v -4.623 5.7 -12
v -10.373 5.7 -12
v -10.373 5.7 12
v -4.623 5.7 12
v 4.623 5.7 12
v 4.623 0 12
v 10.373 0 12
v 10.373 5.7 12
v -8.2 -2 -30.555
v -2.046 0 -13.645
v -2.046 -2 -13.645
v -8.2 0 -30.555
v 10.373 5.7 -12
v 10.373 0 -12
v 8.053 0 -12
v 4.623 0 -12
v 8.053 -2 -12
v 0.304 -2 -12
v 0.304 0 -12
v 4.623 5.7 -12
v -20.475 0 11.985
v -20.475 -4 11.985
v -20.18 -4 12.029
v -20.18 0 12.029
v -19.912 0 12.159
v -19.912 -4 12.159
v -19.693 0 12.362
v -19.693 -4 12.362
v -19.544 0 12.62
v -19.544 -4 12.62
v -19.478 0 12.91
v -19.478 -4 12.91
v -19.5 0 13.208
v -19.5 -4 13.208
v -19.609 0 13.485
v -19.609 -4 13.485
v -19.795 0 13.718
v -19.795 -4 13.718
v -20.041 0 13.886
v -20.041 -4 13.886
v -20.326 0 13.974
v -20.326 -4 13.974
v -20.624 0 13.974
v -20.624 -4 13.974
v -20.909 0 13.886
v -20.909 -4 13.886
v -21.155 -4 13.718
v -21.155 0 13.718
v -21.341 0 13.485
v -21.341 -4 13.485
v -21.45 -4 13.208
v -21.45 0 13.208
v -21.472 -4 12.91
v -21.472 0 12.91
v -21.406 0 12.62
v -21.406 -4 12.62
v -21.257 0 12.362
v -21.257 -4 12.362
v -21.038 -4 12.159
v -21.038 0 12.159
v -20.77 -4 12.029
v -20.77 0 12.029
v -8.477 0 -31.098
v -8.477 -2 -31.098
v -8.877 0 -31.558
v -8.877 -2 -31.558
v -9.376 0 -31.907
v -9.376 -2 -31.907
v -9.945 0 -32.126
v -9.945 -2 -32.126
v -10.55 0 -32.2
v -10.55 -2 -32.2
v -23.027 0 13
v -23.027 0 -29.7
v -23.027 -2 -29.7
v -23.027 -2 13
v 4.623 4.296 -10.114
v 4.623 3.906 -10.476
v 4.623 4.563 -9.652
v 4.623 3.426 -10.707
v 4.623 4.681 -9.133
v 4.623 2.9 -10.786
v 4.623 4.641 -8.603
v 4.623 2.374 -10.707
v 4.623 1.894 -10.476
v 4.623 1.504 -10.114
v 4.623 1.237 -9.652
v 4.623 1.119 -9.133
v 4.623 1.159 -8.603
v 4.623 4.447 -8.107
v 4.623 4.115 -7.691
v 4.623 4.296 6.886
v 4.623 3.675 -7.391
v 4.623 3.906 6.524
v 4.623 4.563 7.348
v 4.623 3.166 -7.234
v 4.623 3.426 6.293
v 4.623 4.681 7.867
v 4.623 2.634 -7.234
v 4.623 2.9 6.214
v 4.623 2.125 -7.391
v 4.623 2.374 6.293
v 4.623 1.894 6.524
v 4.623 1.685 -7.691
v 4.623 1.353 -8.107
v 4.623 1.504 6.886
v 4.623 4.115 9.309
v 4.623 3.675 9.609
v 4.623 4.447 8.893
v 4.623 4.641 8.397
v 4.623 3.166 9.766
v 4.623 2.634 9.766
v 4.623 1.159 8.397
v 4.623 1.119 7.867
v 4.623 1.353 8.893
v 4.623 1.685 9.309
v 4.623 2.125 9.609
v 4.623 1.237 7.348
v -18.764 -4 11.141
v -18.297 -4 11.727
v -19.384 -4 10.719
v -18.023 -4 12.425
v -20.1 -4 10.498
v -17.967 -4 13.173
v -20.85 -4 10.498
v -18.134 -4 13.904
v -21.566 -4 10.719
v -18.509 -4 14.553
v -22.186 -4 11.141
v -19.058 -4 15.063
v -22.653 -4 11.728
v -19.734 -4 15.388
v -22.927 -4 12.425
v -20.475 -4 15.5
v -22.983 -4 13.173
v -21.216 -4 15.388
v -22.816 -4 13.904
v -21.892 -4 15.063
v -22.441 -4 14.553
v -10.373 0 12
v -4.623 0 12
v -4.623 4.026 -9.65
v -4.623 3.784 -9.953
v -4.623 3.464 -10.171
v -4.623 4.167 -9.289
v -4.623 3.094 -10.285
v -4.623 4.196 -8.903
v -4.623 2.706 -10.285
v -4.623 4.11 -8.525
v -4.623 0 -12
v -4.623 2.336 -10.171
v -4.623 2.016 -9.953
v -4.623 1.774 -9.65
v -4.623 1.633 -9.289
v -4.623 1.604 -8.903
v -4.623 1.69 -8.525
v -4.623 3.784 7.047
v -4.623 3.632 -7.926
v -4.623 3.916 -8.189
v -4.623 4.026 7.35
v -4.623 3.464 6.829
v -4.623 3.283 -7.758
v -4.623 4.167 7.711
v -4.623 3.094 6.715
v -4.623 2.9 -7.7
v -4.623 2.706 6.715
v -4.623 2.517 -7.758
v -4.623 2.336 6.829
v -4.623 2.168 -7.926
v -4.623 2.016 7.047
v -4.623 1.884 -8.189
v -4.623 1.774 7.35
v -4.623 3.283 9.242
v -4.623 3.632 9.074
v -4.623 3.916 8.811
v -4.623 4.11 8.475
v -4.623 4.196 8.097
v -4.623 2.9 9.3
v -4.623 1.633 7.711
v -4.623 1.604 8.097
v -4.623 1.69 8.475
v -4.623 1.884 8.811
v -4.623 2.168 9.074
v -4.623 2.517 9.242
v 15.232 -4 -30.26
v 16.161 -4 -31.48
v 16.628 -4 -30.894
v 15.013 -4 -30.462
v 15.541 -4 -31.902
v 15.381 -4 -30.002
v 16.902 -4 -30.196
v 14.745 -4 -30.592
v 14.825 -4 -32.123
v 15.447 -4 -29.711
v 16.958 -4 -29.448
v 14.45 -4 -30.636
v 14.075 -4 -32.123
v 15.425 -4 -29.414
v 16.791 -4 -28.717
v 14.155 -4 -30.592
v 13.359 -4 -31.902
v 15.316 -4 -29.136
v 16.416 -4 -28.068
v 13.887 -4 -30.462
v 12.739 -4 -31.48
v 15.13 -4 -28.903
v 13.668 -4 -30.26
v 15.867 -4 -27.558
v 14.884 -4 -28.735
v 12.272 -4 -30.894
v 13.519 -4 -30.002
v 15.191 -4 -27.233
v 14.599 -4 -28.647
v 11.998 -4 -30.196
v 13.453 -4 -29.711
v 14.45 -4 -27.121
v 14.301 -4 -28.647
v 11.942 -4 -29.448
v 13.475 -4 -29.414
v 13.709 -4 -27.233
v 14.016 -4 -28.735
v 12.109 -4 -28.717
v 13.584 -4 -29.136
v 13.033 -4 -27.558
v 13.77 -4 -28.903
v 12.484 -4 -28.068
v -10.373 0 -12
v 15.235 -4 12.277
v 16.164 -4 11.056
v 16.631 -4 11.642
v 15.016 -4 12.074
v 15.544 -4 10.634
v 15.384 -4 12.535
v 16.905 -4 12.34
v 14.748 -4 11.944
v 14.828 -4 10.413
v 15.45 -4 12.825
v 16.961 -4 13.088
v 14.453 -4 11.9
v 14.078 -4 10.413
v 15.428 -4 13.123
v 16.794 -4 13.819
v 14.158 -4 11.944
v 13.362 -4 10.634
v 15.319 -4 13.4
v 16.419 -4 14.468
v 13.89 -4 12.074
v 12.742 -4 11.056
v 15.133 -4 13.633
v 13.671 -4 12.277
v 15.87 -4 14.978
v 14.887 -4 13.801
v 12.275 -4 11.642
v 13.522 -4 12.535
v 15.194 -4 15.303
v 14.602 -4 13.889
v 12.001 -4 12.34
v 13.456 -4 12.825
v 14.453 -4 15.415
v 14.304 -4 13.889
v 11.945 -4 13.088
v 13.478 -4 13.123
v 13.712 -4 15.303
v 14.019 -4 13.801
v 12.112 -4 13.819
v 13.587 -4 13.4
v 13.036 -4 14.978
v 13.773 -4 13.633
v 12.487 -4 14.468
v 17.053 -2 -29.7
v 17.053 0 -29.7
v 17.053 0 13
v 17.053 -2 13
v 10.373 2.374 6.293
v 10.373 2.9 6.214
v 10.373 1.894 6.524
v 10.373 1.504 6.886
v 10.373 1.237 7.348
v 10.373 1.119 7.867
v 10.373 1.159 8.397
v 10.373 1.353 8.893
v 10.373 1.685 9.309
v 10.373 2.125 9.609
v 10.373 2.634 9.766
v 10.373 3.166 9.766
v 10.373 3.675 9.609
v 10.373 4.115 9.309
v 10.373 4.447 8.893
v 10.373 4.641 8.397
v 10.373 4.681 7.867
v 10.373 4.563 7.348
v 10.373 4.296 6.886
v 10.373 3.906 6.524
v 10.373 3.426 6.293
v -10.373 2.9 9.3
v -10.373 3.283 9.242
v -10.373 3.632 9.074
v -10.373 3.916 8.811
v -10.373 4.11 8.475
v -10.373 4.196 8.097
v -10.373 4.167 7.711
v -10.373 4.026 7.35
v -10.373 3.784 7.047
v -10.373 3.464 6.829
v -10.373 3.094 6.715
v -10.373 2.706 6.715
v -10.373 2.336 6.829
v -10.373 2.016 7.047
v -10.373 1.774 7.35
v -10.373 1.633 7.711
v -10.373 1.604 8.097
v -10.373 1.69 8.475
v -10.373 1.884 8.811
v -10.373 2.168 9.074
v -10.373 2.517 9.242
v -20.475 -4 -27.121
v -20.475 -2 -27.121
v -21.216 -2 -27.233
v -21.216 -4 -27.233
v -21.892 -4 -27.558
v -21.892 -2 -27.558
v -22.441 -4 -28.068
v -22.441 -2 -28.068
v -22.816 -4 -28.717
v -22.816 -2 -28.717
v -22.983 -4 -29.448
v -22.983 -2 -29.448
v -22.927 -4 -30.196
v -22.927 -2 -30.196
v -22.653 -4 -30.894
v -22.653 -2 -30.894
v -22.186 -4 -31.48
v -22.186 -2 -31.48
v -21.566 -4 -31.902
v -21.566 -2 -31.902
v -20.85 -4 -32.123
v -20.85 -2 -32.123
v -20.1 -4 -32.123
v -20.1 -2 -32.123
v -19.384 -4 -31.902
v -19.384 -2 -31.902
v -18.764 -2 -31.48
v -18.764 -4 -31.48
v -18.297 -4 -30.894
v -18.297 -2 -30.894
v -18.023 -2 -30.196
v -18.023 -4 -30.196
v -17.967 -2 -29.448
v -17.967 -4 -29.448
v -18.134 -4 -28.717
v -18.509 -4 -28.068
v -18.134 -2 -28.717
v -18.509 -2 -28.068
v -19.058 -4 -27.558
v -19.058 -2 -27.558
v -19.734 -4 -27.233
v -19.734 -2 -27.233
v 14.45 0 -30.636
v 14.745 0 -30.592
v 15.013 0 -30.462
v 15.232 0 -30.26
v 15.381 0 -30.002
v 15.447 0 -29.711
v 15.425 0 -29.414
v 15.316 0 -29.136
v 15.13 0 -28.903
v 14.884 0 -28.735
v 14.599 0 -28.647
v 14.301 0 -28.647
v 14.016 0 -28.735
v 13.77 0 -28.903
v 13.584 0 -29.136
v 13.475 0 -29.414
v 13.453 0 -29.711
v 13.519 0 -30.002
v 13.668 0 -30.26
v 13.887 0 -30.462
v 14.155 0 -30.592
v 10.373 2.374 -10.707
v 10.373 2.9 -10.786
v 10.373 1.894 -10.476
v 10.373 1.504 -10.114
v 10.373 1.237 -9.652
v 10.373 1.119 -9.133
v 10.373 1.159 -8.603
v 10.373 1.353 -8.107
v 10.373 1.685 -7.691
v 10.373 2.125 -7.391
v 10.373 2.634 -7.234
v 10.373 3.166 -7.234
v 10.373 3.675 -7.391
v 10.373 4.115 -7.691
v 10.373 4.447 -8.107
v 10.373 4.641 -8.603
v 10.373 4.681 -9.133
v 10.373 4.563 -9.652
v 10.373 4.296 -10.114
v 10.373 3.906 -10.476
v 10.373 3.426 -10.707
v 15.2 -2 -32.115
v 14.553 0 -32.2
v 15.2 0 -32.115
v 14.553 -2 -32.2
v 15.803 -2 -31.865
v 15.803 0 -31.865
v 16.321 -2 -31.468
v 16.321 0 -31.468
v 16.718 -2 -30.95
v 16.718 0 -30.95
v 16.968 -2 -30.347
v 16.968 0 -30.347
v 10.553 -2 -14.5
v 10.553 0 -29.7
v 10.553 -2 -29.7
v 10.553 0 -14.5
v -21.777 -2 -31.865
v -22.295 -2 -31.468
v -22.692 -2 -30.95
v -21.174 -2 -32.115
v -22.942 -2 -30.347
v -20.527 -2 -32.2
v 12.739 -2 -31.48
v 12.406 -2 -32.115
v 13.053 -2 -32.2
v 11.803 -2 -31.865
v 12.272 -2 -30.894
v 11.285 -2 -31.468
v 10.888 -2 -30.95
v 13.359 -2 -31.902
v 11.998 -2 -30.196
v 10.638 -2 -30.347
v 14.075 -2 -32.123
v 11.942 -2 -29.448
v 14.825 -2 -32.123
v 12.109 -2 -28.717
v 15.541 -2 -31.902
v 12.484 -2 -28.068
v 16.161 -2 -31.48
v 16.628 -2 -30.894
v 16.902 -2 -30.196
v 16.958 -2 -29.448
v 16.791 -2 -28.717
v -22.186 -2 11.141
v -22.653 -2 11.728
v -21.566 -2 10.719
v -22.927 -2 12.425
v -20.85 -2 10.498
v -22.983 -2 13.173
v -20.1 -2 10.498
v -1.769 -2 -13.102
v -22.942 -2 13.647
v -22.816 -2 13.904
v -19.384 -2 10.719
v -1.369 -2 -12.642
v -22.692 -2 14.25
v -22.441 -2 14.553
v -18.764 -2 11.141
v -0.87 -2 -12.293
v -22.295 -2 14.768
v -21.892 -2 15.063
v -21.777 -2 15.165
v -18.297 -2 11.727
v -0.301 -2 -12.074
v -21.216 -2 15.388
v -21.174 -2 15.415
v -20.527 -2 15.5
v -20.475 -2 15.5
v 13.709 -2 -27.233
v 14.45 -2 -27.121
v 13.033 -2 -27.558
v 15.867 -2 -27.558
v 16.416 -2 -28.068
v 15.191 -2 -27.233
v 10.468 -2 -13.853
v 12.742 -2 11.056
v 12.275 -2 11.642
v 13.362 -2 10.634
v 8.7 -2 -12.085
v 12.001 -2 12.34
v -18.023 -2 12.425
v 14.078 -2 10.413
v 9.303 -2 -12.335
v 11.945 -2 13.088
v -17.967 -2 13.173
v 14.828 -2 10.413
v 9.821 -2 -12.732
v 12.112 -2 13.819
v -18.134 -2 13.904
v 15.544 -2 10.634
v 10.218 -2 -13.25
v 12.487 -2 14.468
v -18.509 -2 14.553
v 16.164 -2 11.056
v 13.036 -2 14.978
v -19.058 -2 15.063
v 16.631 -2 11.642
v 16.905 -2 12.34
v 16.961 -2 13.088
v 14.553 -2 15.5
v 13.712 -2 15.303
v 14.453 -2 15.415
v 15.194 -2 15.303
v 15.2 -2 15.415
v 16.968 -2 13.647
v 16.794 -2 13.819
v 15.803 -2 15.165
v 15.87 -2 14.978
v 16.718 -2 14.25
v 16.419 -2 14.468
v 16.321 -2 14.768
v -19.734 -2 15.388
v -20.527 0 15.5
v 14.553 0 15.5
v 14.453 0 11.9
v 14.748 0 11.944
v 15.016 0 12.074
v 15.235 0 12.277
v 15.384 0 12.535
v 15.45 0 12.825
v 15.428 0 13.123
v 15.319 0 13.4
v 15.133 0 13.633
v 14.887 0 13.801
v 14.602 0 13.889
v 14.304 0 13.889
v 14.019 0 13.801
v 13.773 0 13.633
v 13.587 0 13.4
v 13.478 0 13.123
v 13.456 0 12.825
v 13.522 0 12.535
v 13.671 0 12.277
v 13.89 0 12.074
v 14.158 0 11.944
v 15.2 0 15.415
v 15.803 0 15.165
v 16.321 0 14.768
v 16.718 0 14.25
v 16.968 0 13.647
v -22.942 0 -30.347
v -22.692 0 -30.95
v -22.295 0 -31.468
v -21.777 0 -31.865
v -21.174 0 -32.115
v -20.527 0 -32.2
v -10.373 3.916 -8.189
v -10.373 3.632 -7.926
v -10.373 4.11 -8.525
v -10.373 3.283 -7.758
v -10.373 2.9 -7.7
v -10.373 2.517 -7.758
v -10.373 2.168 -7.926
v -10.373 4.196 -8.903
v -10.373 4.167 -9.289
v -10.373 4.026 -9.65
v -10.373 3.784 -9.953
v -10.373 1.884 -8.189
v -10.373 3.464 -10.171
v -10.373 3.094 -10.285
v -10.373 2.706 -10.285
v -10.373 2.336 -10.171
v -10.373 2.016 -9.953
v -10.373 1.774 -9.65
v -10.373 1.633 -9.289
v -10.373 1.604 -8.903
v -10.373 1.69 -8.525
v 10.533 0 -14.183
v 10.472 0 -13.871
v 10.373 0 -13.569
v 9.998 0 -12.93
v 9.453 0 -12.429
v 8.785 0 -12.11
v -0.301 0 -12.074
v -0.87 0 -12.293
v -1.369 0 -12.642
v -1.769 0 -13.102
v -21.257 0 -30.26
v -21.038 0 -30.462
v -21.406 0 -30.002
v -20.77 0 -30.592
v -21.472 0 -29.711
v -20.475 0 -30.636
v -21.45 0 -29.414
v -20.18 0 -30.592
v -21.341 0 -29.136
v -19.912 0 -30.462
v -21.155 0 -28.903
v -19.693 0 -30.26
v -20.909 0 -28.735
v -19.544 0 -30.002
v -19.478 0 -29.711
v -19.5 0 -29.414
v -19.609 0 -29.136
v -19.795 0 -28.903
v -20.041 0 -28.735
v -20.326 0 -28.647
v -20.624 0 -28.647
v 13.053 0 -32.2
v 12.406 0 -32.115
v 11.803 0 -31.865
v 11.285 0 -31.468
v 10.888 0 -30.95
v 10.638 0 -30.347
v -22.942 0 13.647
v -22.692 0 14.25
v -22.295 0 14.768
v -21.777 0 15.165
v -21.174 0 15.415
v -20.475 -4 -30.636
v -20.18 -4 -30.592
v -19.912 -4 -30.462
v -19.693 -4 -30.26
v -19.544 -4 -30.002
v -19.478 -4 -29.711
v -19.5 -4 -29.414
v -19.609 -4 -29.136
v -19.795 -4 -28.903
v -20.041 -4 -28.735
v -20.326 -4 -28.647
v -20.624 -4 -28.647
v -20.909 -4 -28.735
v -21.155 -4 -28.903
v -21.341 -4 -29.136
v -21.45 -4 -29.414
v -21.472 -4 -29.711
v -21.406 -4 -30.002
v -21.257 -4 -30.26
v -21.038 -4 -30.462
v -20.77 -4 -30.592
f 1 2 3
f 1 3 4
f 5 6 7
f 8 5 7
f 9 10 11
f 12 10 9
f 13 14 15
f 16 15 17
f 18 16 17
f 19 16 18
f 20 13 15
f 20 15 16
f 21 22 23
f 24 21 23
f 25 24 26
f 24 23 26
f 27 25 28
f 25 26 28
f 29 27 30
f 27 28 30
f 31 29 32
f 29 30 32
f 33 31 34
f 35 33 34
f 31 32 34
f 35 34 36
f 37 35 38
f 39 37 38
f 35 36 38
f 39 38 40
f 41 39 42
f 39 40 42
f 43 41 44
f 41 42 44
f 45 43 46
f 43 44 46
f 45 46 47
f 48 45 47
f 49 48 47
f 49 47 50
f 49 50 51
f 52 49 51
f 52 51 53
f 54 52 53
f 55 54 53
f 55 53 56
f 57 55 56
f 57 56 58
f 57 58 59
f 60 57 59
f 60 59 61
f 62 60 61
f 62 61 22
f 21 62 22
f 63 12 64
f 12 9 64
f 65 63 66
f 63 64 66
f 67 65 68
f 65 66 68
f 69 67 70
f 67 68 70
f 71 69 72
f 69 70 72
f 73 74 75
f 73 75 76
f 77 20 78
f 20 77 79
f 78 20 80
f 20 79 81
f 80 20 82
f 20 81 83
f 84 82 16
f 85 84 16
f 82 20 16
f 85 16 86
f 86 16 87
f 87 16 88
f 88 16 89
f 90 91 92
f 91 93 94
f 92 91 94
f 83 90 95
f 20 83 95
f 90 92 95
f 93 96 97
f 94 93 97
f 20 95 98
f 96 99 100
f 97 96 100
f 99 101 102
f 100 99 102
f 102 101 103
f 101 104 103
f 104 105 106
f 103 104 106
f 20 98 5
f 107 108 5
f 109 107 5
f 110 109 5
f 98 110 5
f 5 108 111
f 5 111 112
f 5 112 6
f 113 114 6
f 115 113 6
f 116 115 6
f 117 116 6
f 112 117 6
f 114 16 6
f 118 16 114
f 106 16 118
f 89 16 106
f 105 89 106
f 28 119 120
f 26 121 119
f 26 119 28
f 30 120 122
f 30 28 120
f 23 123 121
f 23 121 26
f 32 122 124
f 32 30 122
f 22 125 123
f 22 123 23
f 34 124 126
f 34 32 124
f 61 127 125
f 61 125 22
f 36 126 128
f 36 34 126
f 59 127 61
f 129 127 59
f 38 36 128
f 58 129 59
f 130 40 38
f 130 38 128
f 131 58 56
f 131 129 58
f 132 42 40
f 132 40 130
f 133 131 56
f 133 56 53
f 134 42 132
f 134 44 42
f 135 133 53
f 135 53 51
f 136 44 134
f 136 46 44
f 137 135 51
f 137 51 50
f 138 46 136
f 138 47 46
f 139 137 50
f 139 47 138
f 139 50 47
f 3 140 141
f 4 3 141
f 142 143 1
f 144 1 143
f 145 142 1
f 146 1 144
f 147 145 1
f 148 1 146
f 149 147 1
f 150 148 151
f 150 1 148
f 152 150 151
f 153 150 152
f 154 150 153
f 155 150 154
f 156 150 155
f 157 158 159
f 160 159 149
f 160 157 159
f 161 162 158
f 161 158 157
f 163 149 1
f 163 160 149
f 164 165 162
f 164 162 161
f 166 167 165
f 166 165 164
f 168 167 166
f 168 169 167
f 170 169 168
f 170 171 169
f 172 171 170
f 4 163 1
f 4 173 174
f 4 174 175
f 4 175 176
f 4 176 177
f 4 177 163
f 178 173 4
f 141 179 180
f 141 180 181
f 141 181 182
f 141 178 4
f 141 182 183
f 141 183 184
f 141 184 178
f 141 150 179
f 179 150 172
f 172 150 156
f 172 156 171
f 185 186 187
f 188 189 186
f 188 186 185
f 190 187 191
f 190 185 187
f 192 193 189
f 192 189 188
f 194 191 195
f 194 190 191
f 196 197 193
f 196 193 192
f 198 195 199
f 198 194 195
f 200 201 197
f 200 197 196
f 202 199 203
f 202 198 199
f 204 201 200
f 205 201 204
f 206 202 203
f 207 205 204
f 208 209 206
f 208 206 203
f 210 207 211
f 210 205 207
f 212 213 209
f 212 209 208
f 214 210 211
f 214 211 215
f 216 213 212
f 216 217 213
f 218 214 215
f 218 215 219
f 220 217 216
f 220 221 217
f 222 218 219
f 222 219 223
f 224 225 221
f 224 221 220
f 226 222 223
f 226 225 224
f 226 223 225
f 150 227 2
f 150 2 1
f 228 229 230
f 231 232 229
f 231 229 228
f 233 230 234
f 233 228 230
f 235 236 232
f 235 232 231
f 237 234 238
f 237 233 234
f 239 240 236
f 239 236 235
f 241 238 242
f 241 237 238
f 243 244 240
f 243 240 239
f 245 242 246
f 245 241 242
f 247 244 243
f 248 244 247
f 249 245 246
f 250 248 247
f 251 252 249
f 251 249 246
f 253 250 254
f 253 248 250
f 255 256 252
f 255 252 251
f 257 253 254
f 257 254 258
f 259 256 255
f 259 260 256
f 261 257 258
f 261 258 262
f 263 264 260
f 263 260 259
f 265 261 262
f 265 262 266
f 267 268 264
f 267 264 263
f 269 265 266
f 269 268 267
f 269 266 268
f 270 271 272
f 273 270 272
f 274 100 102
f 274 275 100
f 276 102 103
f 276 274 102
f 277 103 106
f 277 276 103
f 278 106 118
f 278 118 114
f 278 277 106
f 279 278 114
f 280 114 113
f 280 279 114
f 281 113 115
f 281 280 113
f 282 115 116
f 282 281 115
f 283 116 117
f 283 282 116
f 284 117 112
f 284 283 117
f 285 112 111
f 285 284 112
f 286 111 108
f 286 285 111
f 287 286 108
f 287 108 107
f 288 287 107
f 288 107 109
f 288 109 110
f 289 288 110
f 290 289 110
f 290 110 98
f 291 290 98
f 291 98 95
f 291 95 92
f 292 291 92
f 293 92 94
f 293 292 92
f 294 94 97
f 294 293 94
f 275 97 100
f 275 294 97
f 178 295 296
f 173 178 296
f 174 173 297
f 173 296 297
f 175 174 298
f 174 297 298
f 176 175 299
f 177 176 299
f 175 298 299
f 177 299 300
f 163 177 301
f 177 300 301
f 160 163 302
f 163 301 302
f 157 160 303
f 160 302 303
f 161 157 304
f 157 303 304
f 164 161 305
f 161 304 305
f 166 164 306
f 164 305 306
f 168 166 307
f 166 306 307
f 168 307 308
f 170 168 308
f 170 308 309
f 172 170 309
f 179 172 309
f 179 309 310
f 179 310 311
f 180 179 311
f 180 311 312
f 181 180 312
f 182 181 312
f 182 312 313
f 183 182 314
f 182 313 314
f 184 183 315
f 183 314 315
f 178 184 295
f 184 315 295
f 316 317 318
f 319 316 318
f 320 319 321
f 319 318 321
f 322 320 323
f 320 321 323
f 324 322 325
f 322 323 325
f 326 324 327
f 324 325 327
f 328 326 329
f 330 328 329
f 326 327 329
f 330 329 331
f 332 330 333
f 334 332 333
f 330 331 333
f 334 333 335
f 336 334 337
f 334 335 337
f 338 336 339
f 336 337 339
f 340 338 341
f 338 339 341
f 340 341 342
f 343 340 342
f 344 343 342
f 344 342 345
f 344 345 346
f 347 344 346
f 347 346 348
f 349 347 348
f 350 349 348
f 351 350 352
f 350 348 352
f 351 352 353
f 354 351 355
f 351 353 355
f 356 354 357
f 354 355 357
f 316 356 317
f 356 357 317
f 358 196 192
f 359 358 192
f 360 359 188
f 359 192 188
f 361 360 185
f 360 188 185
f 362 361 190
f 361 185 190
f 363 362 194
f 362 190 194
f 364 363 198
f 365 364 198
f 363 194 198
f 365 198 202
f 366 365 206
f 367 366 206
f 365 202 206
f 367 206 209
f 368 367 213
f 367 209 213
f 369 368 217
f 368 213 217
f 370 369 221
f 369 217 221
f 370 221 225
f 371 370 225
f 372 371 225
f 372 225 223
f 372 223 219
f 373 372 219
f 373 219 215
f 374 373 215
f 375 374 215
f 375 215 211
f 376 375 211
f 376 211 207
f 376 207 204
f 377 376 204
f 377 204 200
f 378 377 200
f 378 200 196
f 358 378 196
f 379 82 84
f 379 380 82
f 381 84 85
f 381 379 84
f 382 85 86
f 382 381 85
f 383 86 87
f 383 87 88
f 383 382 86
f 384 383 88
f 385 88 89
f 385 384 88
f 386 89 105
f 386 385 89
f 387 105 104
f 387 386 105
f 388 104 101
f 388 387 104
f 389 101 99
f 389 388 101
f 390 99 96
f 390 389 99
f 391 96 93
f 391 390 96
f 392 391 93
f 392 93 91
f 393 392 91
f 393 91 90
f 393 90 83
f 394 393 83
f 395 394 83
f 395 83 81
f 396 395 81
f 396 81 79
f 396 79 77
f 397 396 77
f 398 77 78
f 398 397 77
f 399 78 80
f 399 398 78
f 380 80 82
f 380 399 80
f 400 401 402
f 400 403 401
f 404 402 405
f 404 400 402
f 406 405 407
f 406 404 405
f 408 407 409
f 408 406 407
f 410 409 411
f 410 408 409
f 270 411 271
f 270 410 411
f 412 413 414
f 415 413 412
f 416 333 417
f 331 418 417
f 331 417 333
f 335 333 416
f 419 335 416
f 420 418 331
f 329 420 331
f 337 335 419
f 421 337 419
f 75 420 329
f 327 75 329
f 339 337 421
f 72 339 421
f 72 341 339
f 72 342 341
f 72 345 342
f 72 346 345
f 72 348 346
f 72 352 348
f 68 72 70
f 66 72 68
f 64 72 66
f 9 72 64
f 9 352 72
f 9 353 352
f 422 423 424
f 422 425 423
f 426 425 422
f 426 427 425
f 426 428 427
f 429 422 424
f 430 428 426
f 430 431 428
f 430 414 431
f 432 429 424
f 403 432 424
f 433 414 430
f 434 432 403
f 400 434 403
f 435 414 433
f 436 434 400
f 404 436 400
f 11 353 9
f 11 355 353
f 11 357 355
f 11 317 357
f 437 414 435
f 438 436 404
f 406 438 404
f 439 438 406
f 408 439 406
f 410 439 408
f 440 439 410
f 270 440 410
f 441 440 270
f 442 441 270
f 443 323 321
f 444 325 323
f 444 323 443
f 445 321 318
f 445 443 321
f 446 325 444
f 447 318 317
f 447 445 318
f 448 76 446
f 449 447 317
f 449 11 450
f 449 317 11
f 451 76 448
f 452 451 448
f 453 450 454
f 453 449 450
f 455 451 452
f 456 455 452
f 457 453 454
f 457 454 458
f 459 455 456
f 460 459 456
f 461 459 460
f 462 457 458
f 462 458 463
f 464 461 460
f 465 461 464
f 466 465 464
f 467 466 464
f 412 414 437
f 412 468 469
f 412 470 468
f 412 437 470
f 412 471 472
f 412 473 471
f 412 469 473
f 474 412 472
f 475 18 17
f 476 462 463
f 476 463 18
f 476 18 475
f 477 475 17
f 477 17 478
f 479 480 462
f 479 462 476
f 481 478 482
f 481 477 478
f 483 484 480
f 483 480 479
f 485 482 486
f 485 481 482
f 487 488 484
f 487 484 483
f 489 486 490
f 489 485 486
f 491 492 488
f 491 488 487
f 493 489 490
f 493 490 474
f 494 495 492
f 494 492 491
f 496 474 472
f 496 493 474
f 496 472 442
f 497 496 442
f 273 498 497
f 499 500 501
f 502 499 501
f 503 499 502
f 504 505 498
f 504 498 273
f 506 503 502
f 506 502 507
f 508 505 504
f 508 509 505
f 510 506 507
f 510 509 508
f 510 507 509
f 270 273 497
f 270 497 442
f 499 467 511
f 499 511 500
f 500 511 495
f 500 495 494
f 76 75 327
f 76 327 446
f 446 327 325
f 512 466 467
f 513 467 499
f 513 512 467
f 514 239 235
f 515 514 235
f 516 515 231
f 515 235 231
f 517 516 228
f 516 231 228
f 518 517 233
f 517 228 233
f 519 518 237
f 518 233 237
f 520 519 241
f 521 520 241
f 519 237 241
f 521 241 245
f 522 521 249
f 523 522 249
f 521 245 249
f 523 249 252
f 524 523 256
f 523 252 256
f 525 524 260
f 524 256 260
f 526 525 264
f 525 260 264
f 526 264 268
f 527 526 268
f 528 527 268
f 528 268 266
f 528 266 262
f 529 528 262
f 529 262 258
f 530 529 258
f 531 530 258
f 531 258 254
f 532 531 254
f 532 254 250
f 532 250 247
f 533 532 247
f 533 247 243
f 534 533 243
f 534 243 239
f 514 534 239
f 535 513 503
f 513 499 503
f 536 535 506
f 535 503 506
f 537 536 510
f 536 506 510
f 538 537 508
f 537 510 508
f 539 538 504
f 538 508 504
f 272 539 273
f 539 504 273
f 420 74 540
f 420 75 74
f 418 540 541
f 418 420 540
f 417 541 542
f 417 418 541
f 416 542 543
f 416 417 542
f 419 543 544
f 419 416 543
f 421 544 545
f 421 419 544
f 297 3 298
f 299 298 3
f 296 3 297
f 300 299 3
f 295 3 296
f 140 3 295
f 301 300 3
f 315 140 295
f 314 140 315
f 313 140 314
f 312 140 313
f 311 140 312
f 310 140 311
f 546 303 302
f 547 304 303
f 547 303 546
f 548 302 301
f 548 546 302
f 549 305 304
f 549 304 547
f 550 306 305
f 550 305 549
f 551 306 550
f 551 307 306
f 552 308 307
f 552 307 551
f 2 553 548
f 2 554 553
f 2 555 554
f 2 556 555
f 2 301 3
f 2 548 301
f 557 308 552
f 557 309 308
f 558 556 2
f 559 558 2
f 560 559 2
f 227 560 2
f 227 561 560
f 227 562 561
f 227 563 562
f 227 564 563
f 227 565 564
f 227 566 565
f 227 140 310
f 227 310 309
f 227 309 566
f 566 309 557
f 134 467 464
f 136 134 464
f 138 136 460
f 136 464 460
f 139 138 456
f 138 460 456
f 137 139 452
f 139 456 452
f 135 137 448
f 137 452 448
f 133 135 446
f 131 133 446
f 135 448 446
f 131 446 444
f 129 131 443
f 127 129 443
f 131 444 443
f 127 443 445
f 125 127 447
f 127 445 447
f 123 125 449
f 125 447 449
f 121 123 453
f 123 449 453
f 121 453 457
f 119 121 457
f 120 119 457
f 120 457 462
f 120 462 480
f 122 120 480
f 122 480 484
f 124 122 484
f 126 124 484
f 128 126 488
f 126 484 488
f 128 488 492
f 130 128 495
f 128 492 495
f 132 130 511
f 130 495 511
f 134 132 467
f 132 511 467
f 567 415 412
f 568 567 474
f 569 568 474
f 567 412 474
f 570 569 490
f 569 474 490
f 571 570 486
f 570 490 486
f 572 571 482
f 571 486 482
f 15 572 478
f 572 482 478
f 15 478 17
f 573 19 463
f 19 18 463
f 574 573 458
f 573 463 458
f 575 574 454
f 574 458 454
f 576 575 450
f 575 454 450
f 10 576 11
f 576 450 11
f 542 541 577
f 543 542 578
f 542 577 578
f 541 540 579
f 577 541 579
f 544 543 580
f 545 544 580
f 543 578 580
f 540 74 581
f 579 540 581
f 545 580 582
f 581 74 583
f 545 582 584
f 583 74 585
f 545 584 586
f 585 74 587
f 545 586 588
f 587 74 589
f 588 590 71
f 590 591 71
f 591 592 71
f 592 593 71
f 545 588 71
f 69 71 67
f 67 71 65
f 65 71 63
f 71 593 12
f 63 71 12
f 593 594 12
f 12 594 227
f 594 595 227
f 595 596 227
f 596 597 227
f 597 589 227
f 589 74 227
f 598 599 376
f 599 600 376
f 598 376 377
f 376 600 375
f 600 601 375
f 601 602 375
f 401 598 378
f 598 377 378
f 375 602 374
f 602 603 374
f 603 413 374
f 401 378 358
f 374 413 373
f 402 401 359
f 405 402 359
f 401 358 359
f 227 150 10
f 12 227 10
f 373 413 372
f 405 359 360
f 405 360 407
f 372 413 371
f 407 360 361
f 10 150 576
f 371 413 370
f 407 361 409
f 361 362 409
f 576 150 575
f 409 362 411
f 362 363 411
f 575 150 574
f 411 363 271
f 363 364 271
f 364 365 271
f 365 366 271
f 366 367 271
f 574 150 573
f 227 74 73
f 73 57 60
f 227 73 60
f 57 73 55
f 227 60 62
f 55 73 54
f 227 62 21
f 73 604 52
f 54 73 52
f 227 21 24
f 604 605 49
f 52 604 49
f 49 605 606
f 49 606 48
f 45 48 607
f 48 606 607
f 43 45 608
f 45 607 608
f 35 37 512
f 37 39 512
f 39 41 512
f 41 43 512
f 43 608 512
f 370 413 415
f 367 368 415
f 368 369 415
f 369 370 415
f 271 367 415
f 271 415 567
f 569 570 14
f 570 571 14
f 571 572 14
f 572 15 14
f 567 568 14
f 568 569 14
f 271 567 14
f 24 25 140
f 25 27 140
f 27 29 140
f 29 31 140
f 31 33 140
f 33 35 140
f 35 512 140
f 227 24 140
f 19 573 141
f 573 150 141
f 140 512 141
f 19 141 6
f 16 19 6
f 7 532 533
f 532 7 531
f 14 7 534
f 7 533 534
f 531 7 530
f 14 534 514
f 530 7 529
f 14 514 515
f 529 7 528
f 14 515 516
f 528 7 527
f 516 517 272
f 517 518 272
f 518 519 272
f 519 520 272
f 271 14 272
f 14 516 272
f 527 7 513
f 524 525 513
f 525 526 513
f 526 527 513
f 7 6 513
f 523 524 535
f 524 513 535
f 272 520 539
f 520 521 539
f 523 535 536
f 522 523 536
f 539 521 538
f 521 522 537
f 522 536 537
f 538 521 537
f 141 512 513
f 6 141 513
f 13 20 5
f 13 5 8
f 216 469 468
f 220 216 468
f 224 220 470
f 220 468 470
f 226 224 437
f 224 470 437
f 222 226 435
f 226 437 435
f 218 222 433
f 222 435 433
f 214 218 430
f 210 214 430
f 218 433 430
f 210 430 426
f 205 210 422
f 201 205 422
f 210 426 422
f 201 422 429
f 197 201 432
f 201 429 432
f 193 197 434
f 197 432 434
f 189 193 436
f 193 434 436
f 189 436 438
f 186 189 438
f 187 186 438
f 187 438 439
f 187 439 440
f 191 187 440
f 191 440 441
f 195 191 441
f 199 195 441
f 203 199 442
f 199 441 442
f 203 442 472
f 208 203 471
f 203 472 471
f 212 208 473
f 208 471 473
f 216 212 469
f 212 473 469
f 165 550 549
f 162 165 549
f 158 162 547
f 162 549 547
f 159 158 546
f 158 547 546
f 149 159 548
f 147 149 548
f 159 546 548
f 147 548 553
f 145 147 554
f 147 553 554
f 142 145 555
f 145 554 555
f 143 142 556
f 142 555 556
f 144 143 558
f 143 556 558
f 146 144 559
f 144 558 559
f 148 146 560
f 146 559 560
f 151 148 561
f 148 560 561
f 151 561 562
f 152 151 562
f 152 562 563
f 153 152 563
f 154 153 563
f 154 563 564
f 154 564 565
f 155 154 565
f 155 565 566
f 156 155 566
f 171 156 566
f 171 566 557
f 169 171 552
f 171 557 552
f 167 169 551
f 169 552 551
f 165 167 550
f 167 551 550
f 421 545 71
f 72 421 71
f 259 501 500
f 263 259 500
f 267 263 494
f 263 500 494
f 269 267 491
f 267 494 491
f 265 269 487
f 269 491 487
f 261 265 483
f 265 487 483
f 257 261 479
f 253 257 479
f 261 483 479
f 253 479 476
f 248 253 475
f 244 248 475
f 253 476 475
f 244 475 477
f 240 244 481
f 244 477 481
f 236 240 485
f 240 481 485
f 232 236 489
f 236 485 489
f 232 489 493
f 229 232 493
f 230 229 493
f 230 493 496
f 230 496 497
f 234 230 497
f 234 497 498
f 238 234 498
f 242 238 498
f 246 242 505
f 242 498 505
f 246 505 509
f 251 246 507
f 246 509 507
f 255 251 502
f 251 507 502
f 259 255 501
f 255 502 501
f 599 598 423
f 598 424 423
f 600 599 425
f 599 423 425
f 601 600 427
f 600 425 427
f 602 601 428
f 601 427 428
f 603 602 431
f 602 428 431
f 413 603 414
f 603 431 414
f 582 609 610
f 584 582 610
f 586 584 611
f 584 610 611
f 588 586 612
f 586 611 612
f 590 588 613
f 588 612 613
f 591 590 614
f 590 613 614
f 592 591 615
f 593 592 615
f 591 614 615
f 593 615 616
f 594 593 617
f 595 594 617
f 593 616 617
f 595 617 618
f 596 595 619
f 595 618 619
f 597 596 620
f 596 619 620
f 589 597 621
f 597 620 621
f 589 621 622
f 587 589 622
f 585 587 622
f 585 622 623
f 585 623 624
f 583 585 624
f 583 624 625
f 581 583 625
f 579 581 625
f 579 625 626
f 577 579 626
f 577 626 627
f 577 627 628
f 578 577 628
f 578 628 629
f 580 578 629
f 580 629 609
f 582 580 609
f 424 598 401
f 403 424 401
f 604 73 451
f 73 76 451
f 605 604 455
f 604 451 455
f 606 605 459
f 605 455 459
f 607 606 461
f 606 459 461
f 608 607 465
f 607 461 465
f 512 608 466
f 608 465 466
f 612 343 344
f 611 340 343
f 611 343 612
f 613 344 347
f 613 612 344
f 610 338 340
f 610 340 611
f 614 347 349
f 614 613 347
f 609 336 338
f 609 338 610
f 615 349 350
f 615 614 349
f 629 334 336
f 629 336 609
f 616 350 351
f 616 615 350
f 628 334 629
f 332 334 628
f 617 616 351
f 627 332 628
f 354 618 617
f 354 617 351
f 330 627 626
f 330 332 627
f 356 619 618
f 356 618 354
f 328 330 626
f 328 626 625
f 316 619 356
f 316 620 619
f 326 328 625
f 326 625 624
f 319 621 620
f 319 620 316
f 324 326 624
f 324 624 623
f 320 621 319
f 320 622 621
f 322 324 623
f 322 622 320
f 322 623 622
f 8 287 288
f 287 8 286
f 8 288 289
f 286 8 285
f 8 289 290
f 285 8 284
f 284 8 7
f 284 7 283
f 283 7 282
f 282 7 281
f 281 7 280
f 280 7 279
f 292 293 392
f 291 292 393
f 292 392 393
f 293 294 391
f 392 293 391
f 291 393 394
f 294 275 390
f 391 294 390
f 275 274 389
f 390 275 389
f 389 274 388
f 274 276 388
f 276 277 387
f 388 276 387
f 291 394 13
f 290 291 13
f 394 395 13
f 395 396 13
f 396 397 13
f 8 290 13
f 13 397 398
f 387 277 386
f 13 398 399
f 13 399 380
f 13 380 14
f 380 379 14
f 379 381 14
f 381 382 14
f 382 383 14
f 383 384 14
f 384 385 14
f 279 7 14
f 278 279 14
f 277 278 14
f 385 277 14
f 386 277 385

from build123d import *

# Parameters (mm, degrees)
SKETCH1_W                                = 20.746
SKETCH1_H                                = 24
BOSS_EXTRUDE1_DEPTH                      = 5.7
SKETCH9_W                                = 9.246
SKETCH9_H                                = 24
CUT_EXTRUDE3_DEPTH                       = 17.854943755
F_9_64_0_14063_DIAMETER_HOLE1_AT_2_COUNT = 2
F_9_64_0_14063_DIAMETER_HOLE1_AT_2_PITCH = 17
SKETCH8_R                                = 1.3
CUT_EXTRUDE2_DEPTH                       = 5.75
SKETCH10_W                               = 40.08
SKETCH10_H                               = 47.7
BOSS_EXTRUDE2_DEPTH                      = 2
SKETCH11_R                               = 2.515
BOSS_EXTRUDE3_DEPTH                      = 2
SKETCH12_R                               = 1
CUT_EXTRUDE4_DEPTH                       = 41.757486785
FILLET2_R                                = 2.5
CUT_EXTRUDE5_DEPTH                       = 40.994658756
FILLET3_R                                = 2.5
CUT_EXTRUDE6_DEPTH                       = 5.7


with BuildPart() as part:
    # Sketch1 → Boss-Extrude1 (new body)
    with BuildSketch(Plane(origin=(0, 0, 0), x_dir=(1, 0, 0), z_dir=(0, 1, 0))):
        Rectangle(SKETCH1_W, SKETCH1_H)
    extrude(amount=BOSS_EXTRUDE1_DEPTH)

    # Sketch9 → Cut-Extrude3 (cut, through all)
    with BuildSketch(Plane.XZ):
        Rectangle(SKETCH9_W, SKETCH9_H)
    extrude(amount=-CUT_EXTRUDE3_DEPTH, mode=Mode.SUBTRACT)


with BuildPart() as cut_extrude3_piece_1:
    # of the separate pieces the step leaves, piece 1, a body of its own (cut_extrude3_pieces)
    add(part.part.solids().sort_by_distance((-10.373, 0, -12))[0])

    # Sketch8 → Cut-Extrude2 (cut)
    with BuildSketch(Plane.ZY.offset(10.373)):
        with Locations((8, 2.9)):
            Circle(SKETCH8_R)
        with Locations((-9, 2.9)):
            Circle(SKETCH8_R)
    extrude(amount=-CUT_EXTRUDE2_DEPTH, mode=Mode.SUBTRACT)



with BuildPart() as cut_extrude3_piece_2:
    # of the separate pieces the step leaves, piece 2, a body of its own (cut_extrude3_pieces)
    add(part.part.solids().sort_by_distance((4.623, 0, -12))[0])

    # Sketch7 → 9/64 (0.14063) Diameter Hole1 (revolve, cut)
    with BuildSketch(Plane(origin=(10.373, 2.9, -9), x_dir=(0, 0, -1), z_dir=(0, 1, 0))):
        Polygon((0, 0), (0, 6.823137666), (1.786001, 5.75), (1.786001, 0), align=None)
    f_9_64_0_14063_diameter_hole1 = revolve(axis=Axis((16.723, 2.9, -9), (-1, 0, 0)), mode=Mode.SUBTRACT)

    # 9/64 (0.14063) Diameter Hole1 at 2: 9/64 (0.14063) Diameter Hole1 ×2
    with Locations(*[(0, 0, i * F_9_64_0_14063_DIAMETER_HOLE1_AT_2_PITCH) for i in range(1, F_9_64_0_14063_DIAMETER_HOLE1_AT_2_COUNT)]):
        add(f_9_64_0_14063_diameter_hole1, mode=Mode.SUBTRACT)


with BuildPart() as cut_extrude3_piece_1_1:
    add(cut_extrude3_piece_1.part)

    add(cut_extrude3_piece_2.part)  # Boss-Extrude2 merges Cut-Extrude3 piece 2
    # Sketch10 → Boss-Extrude2 (add)
    with BuildSketch(Plane.XZ):
        with Locations((-2.987, -8.35)):
            Rectangle(SKETCH10_W, SKETCH10_H)
    extrude(amount=BOSS_EXTRUDE2_DEPTH)

    # Sketch11 → Boss-Extrude3 (add)
    with BuildSketch(Plane.XZ.offset(2)):
        with Locations(Location((14.453, 12.9, 0), (0, 0, 90))):
            Circle(SKETCH11_R)
        with Locations(Location((-20.475, 12.985, 0), (0, 0, 90))):
            Circle(SKETCH11_R)
        with Locations(Location((14.45, -29.6362, 0), (0, 0, 90))):
            Circle(SKETCH11_R)
        with Locations(Location((-20.475, -29.6362, 0), (0, 0, 90))):
            Circle(SKETCH11_R)
    extrude(amount=BOSS_EXTRUDE3_DEPTH)

    # Sketch12 → Cut-Extrude4 (cut, through all)
    with BuildSketch(Plane.XZ.offset(4)):
        with Locations(Location((14.453, 12.9, 0), (0, 0, 270))):
            Circle(SKETCH12_R)
        with Locations(Location((-20.475, 12.985, 0), (0, 0, 270))):
            Circle(SKETCH12_R)
        with Locations(Location((-20.475, -29.6362, 0), (0, 0, 270))):
            Circle(SKETCH12_R)
        with Locations(Location((14.45, -29.6362, 0), (0, 0, 270))):
            Circle(SKETCH12_R)
    extrude(amount=-CUT_EXTRUDE4_DEPTH, mode=Mode.SUBTRACT)

    # Fillet2
    fillet2_edges = [cut_extrude3_piece_1_1.edges().sort_by_distance(p)[0] for p in [
        (17.053, -1, -32.2),
        (17.053, -1, 15.5),
        (-23.027, -1, 15.5),
        (-23.027, -1, -32.2),
    ]]
    fillet(fillet2_edges, radius=FILLET2_R)

    # Sketch14 → Cut-Extrude5 (cut, through all)
    with BuildSketch(Plane(origin=(0, 0, 0), x_dir=(1, 0, 0), z_dir=(0, 1, 0))):
        Polygon((10.553, 32.2), (10.553, 12), (-1.447, 12), (-8.799198732, 32.2), align=None)
    extrude(amount=-CUT_EXTRUDE5_DEPTH, mode=Mode.SUBTRACT)

    # Fillet3
    fillet3_edges = [cut_extrude3_piece_1_1.edges().sort_by_distance(p)[0] for p in [
        (10.553, -1, -12),
        (-1.447, -1, -12),
        (10.553, -1, -32.2),
        (-8.799198732, -1, -32.2),
    ]]
    fillet(fillet3_edges, radius=FILLET3_R)

    # Sketch15 → Cut-Extrude6 (cut)
    with BuildSketch(Plane(origin=(0, 5.7, 0), x_dir=(1, 0, 0), z_dir=(0, 1, 0))):
        with BuildLine():
            Line((8.053, 12), (10.373, 12))
            Line((10.373, 12), (10.373, 13.568549518))
            ThreePointArc((10.373, 13.568549518), (9.453245299, 12.428934308), (8.053, 12))
        make_face()
    extrude(amount=-CUT_EXTRUDE6_DEPTH, mode=Mode.SUBTRACT)


solid = cut_extrude3_piece_1_1.part
